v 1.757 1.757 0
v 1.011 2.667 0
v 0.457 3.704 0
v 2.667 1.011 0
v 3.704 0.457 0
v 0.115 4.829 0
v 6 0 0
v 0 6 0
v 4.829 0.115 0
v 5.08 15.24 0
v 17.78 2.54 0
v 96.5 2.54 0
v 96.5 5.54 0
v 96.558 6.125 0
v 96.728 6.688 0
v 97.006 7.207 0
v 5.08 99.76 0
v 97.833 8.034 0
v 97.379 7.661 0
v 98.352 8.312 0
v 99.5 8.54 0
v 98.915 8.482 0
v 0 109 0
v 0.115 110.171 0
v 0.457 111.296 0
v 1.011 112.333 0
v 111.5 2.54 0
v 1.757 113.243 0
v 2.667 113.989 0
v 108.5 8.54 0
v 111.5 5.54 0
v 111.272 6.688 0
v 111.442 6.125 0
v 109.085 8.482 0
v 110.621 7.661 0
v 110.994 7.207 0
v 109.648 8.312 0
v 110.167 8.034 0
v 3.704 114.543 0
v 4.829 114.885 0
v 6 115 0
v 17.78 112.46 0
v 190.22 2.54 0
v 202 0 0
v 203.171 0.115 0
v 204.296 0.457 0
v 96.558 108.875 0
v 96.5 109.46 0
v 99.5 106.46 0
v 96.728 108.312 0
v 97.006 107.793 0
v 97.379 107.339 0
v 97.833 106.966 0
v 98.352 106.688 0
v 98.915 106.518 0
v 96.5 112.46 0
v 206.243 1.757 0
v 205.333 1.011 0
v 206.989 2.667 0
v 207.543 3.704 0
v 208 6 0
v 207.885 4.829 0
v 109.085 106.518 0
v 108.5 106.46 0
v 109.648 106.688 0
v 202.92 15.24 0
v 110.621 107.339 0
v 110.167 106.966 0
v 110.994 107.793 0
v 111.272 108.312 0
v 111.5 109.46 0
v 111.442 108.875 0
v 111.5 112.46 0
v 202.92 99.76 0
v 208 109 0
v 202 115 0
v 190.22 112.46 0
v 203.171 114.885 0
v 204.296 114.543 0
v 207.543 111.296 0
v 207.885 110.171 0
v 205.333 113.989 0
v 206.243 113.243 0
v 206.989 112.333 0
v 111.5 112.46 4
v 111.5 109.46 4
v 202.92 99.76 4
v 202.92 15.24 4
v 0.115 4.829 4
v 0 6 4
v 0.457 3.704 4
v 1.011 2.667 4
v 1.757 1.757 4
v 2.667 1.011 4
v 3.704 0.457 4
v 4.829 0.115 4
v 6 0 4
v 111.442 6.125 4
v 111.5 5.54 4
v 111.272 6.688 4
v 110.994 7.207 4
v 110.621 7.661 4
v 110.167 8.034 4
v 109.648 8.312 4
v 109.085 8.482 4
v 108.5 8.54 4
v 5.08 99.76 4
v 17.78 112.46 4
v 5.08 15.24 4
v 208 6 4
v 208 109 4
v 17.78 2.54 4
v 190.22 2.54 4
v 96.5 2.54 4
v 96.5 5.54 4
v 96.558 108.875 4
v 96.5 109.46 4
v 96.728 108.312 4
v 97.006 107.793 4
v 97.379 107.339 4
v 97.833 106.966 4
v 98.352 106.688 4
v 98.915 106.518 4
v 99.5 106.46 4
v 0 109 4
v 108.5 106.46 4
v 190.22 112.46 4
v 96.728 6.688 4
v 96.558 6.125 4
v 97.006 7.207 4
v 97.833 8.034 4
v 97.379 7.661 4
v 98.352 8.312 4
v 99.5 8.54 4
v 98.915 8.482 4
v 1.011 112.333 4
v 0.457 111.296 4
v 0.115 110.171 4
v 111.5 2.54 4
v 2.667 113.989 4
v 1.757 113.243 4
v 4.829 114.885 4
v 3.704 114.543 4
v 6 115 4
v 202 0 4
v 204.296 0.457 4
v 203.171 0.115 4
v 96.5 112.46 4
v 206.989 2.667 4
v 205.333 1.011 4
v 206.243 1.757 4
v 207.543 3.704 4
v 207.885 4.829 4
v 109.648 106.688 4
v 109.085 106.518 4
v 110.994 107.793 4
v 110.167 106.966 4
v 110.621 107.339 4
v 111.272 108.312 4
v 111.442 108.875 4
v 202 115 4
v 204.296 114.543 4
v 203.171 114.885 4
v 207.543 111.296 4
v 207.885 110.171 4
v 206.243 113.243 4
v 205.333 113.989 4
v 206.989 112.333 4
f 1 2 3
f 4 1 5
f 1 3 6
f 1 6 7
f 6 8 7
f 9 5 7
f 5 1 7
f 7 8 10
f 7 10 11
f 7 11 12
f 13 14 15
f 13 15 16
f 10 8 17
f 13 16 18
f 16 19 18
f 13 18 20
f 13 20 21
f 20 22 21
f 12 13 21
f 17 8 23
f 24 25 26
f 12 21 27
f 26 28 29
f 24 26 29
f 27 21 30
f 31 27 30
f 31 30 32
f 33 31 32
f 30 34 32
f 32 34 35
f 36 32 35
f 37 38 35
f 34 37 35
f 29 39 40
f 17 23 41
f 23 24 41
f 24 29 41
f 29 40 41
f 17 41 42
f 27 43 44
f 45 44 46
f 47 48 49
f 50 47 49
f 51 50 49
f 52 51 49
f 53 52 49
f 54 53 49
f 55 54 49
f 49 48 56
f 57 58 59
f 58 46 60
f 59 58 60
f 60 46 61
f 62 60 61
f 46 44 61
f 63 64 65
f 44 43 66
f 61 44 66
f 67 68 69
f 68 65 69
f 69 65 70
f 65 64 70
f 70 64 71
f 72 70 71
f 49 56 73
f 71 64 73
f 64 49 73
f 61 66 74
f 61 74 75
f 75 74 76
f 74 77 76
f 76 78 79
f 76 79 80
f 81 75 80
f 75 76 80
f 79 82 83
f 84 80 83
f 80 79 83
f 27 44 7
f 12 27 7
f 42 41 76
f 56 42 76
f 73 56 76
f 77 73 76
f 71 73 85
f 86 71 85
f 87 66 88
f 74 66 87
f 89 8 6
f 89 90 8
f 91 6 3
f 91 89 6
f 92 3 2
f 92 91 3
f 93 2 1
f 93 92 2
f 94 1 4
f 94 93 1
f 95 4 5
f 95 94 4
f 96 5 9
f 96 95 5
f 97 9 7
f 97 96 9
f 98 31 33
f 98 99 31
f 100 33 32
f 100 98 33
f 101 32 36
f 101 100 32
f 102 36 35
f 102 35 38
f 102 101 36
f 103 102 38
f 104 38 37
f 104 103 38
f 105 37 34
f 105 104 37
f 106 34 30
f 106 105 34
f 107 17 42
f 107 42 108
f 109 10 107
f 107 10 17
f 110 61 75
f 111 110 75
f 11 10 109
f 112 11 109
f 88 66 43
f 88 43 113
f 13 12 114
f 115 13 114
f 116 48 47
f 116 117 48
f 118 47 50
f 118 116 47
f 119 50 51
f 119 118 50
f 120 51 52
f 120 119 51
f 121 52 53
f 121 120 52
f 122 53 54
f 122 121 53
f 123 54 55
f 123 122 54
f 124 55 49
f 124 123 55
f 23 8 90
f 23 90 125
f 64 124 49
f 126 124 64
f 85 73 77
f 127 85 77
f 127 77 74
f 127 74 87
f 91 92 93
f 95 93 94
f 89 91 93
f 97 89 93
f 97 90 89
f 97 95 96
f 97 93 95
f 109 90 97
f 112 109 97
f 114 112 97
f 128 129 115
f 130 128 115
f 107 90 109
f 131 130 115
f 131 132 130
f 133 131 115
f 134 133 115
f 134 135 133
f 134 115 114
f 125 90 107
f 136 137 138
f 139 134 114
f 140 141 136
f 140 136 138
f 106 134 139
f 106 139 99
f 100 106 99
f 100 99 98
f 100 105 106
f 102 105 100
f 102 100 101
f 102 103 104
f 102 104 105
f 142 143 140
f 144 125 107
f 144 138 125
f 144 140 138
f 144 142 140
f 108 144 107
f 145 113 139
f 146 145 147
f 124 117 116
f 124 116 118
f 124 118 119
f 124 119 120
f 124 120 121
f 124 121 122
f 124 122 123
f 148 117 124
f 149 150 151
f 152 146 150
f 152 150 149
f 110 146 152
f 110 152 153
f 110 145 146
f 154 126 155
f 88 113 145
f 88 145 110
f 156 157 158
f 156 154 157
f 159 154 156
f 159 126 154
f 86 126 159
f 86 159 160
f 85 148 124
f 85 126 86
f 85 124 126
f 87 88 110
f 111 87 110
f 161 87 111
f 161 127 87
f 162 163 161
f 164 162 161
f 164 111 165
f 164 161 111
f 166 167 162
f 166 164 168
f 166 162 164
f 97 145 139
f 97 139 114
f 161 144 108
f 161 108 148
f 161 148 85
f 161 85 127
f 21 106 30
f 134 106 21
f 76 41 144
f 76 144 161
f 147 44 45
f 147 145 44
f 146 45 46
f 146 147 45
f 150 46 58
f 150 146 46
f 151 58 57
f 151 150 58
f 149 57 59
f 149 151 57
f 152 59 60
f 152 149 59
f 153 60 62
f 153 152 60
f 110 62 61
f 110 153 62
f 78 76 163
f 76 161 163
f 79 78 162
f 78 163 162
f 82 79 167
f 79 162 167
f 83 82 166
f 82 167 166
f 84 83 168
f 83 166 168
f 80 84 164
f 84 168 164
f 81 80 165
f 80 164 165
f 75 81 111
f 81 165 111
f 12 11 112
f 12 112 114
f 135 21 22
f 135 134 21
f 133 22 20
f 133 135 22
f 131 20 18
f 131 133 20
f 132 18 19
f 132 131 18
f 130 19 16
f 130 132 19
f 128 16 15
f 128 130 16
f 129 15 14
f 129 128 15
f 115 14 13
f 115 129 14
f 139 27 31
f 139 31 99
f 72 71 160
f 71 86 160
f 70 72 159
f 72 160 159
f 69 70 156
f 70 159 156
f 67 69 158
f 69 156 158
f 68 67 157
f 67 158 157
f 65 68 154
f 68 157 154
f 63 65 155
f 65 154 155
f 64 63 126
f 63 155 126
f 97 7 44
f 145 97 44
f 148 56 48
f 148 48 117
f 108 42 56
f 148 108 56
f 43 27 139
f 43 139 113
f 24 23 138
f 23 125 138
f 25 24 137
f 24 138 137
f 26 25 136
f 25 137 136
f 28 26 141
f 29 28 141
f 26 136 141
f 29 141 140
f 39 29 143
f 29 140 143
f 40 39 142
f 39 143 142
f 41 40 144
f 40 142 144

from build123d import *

# Parameters (mm, degrees)
F0_W     = 208
F0_H     = 115
F0_W_2   = 197.84
F0_H_2   = 109.92
F1_DEPTH = 4
F2_R     = 6
F3_SIZE  = 12.7
F4_W     = 15
F4_H     = 4
F5_DEPTH = 6
F6_W     = 15
F6_H     = 4
F7_DEPTH = 6
F8_R     = 3


with BuildPart() as f1:
    # F0 (on Top) → F1 (new body)
    with BuildSketch(Plane.XY):
        with Locations((104, 57.5)):
            Rectangle(F0_W, F0_H)
        with Locations((104, 57.5)):
            Rectangle(F0_W_2, F0_H_2, mode=Mode.SUBTRACT)
    extrude(amount=F1_DEPTH)

    # F2
    f2_edges = [f1.edges().sort_by_distance(p)[0] for p in [
        (0, 115, 2),
        (208, 115, 2),
        (208, 0, 2),
        (0, 0, 2),
    ]]
    fillet(f2_edges, radius=F2_R)

    # F3
    f3_edges = [f1.edges().sort_by_distance(p)[0] for p in [
        (5.08, 112.46, 2),
        (202.92, 2.54, 2),
        (202.92, 112.46, 2),
        (5.08, 2.54, 2),
    ]]
    chamfer(f3_edges, length=F3_SIZE)

    # F4 (on face) → F5 (join)
    with BuildSketch(Plane(origin=(0, 2.54, 0), x_dir=(-1, 0, 0), z_dir=(0, 1, 0))):
        with Locations((-104, 2)):
            Rectangle(F4_W, F4_H)
    extrude(amount=F5_DEPTH)

    # F6 (on face) → F7 (join)
    with BuildSketch(Plane.XZ.offset(-112.46)):
        with Locations((104, 2)):
            Rectangle(F6_W, F6_H)
    extrude(amount=F7_DEPTH)

    # F8
    f8_edges = [f1.edges().sort_by_distance(p)[0] for p in [
        (96.5, 106.46, 2),
        (111.5, 106.46, 2),
        (111.5, 8.54, 2),
        (96.5, 8.54, 2),
    ]]
    fillet(f8_edges, radius=F8_R)


solid = f1.part
